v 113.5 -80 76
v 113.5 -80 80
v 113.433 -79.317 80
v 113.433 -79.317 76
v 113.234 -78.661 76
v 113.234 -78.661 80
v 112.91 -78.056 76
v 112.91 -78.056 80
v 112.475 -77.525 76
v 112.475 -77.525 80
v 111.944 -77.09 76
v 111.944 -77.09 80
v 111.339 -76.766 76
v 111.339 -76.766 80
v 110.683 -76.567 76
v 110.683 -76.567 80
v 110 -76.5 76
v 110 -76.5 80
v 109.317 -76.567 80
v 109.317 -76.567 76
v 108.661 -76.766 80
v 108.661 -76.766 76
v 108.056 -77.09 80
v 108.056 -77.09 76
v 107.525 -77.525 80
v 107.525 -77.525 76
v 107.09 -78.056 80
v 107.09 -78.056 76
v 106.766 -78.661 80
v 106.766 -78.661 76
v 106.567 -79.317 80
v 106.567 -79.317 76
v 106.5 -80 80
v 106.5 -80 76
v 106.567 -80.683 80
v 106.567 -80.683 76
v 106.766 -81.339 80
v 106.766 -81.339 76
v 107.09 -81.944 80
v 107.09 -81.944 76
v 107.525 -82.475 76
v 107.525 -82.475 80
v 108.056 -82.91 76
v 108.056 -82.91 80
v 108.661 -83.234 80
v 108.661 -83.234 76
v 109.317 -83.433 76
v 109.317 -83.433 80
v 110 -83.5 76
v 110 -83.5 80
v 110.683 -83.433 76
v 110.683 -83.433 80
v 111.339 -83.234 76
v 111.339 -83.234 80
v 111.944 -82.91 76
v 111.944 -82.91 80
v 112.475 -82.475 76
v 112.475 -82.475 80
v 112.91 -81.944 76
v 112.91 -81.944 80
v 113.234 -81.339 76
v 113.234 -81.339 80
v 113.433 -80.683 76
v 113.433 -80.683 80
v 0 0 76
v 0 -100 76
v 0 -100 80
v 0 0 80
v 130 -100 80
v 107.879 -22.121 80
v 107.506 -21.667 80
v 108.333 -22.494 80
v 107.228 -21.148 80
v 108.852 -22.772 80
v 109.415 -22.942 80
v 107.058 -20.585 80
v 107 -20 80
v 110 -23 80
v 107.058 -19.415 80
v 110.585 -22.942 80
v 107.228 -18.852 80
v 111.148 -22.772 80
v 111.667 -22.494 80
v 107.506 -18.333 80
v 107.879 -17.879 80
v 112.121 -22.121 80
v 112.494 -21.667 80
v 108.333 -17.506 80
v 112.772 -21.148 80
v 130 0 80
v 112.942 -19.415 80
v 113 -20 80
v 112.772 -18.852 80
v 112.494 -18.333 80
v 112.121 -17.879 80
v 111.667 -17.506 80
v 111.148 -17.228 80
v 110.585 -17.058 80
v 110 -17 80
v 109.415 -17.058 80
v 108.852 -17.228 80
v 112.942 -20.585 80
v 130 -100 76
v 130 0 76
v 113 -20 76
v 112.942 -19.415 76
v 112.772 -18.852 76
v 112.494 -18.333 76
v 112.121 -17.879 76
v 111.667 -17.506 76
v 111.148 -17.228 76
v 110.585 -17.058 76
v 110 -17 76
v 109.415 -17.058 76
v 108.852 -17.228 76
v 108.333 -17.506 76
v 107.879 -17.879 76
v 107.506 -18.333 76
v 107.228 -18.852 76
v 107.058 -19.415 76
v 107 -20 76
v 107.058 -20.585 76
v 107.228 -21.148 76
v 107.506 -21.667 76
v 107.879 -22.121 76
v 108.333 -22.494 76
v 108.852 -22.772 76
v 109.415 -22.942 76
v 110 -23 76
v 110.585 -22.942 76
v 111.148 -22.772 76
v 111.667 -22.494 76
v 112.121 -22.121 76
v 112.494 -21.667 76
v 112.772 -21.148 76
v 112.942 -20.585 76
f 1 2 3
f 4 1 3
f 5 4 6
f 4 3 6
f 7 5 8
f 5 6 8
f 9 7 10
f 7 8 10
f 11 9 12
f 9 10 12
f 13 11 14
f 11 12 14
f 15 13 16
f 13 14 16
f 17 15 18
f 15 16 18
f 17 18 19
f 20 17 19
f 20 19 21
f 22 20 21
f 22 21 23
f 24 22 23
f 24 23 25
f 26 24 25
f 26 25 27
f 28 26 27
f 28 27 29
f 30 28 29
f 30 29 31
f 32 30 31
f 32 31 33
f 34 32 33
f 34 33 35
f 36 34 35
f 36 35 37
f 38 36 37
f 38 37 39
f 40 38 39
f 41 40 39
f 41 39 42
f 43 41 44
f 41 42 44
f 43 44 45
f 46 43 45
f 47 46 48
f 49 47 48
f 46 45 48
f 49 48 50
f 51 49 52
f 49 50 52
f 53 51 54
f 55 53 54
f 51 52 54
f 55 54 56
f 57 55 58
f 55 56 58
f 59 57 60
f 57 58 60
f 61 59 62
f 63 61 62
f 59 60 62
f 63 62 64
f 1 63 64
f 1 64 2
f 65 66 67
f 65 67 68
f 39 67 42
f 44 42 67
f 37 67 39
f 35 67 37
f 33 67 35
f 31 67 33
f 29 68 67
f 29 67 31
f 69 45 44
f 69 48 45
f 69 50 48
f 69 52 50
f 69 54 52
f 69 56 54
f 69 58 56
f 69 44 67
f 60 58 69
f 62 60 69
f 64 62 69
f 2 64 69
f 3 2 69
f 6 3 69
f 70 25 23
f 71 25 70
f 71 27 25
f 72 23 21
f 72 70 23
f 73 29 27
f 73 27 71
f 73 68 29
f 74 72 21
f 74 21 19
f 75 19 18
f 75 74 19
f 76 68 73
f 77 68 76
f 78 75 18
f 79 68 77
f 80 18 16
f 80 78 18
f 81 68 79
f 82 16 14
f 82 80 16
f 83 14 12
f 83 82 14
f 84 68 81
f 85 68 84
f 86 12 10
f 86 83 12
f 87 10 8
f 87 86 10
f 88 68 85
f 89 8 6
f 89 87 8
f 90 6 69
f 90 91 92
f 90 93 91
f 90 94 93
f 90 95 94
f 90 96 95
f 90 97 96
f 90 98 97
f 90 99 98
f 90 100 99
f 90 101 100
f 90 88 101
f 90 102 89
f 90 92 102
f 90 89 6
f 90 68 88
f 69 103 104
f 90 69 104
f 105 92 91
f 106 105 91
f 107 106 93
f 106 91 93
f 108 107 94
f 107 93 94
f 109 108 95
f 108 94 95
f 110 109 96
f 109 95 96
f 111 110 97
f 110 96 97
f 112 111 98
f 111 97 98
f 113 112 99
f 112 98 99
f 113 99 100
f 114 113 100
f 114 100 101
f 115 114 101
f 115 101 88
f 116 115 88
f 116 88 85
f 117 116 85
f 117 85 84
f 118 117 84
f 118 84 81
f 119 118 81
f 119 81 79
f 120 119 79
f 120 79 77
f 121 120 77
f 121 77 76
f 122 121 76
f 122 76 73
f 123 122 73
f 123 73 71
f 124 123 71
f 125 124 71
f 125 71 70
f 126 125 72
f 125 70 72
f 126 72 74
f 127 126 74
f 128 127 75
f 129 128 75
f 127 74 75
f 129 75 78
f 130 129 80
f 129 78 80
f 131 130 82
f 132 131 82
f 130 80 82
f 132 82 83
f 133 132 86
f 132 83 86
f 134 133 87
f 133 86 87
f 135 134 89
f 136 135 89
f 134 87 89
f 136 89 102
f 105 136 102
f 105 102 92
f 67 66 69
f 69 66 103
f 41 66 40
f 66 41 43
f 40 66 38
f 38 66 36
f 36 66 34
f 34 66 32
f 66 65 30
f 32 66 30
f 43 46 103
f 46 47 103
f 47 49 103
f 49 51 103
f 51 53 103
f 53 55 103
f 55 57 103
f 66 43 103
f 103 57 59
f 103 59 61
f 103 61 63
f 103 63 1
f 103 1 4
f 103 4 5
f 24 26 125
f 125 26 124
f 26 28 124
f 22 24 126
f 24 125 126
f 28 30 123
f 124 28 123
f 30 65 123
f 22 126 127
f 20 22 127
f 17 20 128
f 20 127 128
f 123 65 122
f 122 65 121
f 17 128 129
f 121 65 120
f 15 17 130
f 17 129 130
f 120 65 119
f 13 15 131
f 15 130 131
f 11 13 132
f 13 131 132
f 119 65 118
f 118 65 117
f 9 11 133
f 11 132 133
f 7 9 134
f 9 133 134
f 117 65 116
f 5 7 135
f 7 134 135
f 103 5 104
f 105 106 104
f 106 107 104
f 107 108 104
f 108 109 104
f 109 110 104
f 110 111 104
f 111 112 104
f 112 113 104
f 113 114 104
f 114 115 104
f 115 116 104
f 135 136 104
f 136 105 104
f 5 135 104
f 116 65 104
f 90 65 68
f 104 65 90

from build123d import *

# Parameters (mm, degrees)
SKETCH011_W   = 130
SKETCH011_H   = 100
PAD005_DEPTH  = 4
SKETCH013_R   = 3.5
HOLE004_DEPTH = 4.001
SKETCH014_R   = 3
HOLE005_DEPTH = 4.001


with BuildPart() as part:
    # Sketch011 → Pad005 (new body)
    with BuildSketch(Plane.XY.offset(76)):
        with Locations((65, -50)):
            Rectangle(SKETCH011_W, SKETCH011_H)
    extrude(amount=PAD005_DEPTH)

    # Sketch013 (on Face6 of Pad005) → Hole004 (cut, through all)
    with BuildSketch(Plane.XY.offset(80)):
        with Locations((110, -80)):
            Circle(SKETCH013_R)
    extrude(amount=-HOLE004_DEPTH, mode=Mode.SUBTRACT)

    # Sketch014 (on Face5 of Hole004) → Hole005 (cut, through all)
    with BuildSketch(Plane.XY.offset(80)):
        with Locations((110, -20)):
            Circle(SKETCH014_R)
    extrude(amount=-HOLE005_DEPTH, mode=Mode.SUBTRACT)


solid = part.part
